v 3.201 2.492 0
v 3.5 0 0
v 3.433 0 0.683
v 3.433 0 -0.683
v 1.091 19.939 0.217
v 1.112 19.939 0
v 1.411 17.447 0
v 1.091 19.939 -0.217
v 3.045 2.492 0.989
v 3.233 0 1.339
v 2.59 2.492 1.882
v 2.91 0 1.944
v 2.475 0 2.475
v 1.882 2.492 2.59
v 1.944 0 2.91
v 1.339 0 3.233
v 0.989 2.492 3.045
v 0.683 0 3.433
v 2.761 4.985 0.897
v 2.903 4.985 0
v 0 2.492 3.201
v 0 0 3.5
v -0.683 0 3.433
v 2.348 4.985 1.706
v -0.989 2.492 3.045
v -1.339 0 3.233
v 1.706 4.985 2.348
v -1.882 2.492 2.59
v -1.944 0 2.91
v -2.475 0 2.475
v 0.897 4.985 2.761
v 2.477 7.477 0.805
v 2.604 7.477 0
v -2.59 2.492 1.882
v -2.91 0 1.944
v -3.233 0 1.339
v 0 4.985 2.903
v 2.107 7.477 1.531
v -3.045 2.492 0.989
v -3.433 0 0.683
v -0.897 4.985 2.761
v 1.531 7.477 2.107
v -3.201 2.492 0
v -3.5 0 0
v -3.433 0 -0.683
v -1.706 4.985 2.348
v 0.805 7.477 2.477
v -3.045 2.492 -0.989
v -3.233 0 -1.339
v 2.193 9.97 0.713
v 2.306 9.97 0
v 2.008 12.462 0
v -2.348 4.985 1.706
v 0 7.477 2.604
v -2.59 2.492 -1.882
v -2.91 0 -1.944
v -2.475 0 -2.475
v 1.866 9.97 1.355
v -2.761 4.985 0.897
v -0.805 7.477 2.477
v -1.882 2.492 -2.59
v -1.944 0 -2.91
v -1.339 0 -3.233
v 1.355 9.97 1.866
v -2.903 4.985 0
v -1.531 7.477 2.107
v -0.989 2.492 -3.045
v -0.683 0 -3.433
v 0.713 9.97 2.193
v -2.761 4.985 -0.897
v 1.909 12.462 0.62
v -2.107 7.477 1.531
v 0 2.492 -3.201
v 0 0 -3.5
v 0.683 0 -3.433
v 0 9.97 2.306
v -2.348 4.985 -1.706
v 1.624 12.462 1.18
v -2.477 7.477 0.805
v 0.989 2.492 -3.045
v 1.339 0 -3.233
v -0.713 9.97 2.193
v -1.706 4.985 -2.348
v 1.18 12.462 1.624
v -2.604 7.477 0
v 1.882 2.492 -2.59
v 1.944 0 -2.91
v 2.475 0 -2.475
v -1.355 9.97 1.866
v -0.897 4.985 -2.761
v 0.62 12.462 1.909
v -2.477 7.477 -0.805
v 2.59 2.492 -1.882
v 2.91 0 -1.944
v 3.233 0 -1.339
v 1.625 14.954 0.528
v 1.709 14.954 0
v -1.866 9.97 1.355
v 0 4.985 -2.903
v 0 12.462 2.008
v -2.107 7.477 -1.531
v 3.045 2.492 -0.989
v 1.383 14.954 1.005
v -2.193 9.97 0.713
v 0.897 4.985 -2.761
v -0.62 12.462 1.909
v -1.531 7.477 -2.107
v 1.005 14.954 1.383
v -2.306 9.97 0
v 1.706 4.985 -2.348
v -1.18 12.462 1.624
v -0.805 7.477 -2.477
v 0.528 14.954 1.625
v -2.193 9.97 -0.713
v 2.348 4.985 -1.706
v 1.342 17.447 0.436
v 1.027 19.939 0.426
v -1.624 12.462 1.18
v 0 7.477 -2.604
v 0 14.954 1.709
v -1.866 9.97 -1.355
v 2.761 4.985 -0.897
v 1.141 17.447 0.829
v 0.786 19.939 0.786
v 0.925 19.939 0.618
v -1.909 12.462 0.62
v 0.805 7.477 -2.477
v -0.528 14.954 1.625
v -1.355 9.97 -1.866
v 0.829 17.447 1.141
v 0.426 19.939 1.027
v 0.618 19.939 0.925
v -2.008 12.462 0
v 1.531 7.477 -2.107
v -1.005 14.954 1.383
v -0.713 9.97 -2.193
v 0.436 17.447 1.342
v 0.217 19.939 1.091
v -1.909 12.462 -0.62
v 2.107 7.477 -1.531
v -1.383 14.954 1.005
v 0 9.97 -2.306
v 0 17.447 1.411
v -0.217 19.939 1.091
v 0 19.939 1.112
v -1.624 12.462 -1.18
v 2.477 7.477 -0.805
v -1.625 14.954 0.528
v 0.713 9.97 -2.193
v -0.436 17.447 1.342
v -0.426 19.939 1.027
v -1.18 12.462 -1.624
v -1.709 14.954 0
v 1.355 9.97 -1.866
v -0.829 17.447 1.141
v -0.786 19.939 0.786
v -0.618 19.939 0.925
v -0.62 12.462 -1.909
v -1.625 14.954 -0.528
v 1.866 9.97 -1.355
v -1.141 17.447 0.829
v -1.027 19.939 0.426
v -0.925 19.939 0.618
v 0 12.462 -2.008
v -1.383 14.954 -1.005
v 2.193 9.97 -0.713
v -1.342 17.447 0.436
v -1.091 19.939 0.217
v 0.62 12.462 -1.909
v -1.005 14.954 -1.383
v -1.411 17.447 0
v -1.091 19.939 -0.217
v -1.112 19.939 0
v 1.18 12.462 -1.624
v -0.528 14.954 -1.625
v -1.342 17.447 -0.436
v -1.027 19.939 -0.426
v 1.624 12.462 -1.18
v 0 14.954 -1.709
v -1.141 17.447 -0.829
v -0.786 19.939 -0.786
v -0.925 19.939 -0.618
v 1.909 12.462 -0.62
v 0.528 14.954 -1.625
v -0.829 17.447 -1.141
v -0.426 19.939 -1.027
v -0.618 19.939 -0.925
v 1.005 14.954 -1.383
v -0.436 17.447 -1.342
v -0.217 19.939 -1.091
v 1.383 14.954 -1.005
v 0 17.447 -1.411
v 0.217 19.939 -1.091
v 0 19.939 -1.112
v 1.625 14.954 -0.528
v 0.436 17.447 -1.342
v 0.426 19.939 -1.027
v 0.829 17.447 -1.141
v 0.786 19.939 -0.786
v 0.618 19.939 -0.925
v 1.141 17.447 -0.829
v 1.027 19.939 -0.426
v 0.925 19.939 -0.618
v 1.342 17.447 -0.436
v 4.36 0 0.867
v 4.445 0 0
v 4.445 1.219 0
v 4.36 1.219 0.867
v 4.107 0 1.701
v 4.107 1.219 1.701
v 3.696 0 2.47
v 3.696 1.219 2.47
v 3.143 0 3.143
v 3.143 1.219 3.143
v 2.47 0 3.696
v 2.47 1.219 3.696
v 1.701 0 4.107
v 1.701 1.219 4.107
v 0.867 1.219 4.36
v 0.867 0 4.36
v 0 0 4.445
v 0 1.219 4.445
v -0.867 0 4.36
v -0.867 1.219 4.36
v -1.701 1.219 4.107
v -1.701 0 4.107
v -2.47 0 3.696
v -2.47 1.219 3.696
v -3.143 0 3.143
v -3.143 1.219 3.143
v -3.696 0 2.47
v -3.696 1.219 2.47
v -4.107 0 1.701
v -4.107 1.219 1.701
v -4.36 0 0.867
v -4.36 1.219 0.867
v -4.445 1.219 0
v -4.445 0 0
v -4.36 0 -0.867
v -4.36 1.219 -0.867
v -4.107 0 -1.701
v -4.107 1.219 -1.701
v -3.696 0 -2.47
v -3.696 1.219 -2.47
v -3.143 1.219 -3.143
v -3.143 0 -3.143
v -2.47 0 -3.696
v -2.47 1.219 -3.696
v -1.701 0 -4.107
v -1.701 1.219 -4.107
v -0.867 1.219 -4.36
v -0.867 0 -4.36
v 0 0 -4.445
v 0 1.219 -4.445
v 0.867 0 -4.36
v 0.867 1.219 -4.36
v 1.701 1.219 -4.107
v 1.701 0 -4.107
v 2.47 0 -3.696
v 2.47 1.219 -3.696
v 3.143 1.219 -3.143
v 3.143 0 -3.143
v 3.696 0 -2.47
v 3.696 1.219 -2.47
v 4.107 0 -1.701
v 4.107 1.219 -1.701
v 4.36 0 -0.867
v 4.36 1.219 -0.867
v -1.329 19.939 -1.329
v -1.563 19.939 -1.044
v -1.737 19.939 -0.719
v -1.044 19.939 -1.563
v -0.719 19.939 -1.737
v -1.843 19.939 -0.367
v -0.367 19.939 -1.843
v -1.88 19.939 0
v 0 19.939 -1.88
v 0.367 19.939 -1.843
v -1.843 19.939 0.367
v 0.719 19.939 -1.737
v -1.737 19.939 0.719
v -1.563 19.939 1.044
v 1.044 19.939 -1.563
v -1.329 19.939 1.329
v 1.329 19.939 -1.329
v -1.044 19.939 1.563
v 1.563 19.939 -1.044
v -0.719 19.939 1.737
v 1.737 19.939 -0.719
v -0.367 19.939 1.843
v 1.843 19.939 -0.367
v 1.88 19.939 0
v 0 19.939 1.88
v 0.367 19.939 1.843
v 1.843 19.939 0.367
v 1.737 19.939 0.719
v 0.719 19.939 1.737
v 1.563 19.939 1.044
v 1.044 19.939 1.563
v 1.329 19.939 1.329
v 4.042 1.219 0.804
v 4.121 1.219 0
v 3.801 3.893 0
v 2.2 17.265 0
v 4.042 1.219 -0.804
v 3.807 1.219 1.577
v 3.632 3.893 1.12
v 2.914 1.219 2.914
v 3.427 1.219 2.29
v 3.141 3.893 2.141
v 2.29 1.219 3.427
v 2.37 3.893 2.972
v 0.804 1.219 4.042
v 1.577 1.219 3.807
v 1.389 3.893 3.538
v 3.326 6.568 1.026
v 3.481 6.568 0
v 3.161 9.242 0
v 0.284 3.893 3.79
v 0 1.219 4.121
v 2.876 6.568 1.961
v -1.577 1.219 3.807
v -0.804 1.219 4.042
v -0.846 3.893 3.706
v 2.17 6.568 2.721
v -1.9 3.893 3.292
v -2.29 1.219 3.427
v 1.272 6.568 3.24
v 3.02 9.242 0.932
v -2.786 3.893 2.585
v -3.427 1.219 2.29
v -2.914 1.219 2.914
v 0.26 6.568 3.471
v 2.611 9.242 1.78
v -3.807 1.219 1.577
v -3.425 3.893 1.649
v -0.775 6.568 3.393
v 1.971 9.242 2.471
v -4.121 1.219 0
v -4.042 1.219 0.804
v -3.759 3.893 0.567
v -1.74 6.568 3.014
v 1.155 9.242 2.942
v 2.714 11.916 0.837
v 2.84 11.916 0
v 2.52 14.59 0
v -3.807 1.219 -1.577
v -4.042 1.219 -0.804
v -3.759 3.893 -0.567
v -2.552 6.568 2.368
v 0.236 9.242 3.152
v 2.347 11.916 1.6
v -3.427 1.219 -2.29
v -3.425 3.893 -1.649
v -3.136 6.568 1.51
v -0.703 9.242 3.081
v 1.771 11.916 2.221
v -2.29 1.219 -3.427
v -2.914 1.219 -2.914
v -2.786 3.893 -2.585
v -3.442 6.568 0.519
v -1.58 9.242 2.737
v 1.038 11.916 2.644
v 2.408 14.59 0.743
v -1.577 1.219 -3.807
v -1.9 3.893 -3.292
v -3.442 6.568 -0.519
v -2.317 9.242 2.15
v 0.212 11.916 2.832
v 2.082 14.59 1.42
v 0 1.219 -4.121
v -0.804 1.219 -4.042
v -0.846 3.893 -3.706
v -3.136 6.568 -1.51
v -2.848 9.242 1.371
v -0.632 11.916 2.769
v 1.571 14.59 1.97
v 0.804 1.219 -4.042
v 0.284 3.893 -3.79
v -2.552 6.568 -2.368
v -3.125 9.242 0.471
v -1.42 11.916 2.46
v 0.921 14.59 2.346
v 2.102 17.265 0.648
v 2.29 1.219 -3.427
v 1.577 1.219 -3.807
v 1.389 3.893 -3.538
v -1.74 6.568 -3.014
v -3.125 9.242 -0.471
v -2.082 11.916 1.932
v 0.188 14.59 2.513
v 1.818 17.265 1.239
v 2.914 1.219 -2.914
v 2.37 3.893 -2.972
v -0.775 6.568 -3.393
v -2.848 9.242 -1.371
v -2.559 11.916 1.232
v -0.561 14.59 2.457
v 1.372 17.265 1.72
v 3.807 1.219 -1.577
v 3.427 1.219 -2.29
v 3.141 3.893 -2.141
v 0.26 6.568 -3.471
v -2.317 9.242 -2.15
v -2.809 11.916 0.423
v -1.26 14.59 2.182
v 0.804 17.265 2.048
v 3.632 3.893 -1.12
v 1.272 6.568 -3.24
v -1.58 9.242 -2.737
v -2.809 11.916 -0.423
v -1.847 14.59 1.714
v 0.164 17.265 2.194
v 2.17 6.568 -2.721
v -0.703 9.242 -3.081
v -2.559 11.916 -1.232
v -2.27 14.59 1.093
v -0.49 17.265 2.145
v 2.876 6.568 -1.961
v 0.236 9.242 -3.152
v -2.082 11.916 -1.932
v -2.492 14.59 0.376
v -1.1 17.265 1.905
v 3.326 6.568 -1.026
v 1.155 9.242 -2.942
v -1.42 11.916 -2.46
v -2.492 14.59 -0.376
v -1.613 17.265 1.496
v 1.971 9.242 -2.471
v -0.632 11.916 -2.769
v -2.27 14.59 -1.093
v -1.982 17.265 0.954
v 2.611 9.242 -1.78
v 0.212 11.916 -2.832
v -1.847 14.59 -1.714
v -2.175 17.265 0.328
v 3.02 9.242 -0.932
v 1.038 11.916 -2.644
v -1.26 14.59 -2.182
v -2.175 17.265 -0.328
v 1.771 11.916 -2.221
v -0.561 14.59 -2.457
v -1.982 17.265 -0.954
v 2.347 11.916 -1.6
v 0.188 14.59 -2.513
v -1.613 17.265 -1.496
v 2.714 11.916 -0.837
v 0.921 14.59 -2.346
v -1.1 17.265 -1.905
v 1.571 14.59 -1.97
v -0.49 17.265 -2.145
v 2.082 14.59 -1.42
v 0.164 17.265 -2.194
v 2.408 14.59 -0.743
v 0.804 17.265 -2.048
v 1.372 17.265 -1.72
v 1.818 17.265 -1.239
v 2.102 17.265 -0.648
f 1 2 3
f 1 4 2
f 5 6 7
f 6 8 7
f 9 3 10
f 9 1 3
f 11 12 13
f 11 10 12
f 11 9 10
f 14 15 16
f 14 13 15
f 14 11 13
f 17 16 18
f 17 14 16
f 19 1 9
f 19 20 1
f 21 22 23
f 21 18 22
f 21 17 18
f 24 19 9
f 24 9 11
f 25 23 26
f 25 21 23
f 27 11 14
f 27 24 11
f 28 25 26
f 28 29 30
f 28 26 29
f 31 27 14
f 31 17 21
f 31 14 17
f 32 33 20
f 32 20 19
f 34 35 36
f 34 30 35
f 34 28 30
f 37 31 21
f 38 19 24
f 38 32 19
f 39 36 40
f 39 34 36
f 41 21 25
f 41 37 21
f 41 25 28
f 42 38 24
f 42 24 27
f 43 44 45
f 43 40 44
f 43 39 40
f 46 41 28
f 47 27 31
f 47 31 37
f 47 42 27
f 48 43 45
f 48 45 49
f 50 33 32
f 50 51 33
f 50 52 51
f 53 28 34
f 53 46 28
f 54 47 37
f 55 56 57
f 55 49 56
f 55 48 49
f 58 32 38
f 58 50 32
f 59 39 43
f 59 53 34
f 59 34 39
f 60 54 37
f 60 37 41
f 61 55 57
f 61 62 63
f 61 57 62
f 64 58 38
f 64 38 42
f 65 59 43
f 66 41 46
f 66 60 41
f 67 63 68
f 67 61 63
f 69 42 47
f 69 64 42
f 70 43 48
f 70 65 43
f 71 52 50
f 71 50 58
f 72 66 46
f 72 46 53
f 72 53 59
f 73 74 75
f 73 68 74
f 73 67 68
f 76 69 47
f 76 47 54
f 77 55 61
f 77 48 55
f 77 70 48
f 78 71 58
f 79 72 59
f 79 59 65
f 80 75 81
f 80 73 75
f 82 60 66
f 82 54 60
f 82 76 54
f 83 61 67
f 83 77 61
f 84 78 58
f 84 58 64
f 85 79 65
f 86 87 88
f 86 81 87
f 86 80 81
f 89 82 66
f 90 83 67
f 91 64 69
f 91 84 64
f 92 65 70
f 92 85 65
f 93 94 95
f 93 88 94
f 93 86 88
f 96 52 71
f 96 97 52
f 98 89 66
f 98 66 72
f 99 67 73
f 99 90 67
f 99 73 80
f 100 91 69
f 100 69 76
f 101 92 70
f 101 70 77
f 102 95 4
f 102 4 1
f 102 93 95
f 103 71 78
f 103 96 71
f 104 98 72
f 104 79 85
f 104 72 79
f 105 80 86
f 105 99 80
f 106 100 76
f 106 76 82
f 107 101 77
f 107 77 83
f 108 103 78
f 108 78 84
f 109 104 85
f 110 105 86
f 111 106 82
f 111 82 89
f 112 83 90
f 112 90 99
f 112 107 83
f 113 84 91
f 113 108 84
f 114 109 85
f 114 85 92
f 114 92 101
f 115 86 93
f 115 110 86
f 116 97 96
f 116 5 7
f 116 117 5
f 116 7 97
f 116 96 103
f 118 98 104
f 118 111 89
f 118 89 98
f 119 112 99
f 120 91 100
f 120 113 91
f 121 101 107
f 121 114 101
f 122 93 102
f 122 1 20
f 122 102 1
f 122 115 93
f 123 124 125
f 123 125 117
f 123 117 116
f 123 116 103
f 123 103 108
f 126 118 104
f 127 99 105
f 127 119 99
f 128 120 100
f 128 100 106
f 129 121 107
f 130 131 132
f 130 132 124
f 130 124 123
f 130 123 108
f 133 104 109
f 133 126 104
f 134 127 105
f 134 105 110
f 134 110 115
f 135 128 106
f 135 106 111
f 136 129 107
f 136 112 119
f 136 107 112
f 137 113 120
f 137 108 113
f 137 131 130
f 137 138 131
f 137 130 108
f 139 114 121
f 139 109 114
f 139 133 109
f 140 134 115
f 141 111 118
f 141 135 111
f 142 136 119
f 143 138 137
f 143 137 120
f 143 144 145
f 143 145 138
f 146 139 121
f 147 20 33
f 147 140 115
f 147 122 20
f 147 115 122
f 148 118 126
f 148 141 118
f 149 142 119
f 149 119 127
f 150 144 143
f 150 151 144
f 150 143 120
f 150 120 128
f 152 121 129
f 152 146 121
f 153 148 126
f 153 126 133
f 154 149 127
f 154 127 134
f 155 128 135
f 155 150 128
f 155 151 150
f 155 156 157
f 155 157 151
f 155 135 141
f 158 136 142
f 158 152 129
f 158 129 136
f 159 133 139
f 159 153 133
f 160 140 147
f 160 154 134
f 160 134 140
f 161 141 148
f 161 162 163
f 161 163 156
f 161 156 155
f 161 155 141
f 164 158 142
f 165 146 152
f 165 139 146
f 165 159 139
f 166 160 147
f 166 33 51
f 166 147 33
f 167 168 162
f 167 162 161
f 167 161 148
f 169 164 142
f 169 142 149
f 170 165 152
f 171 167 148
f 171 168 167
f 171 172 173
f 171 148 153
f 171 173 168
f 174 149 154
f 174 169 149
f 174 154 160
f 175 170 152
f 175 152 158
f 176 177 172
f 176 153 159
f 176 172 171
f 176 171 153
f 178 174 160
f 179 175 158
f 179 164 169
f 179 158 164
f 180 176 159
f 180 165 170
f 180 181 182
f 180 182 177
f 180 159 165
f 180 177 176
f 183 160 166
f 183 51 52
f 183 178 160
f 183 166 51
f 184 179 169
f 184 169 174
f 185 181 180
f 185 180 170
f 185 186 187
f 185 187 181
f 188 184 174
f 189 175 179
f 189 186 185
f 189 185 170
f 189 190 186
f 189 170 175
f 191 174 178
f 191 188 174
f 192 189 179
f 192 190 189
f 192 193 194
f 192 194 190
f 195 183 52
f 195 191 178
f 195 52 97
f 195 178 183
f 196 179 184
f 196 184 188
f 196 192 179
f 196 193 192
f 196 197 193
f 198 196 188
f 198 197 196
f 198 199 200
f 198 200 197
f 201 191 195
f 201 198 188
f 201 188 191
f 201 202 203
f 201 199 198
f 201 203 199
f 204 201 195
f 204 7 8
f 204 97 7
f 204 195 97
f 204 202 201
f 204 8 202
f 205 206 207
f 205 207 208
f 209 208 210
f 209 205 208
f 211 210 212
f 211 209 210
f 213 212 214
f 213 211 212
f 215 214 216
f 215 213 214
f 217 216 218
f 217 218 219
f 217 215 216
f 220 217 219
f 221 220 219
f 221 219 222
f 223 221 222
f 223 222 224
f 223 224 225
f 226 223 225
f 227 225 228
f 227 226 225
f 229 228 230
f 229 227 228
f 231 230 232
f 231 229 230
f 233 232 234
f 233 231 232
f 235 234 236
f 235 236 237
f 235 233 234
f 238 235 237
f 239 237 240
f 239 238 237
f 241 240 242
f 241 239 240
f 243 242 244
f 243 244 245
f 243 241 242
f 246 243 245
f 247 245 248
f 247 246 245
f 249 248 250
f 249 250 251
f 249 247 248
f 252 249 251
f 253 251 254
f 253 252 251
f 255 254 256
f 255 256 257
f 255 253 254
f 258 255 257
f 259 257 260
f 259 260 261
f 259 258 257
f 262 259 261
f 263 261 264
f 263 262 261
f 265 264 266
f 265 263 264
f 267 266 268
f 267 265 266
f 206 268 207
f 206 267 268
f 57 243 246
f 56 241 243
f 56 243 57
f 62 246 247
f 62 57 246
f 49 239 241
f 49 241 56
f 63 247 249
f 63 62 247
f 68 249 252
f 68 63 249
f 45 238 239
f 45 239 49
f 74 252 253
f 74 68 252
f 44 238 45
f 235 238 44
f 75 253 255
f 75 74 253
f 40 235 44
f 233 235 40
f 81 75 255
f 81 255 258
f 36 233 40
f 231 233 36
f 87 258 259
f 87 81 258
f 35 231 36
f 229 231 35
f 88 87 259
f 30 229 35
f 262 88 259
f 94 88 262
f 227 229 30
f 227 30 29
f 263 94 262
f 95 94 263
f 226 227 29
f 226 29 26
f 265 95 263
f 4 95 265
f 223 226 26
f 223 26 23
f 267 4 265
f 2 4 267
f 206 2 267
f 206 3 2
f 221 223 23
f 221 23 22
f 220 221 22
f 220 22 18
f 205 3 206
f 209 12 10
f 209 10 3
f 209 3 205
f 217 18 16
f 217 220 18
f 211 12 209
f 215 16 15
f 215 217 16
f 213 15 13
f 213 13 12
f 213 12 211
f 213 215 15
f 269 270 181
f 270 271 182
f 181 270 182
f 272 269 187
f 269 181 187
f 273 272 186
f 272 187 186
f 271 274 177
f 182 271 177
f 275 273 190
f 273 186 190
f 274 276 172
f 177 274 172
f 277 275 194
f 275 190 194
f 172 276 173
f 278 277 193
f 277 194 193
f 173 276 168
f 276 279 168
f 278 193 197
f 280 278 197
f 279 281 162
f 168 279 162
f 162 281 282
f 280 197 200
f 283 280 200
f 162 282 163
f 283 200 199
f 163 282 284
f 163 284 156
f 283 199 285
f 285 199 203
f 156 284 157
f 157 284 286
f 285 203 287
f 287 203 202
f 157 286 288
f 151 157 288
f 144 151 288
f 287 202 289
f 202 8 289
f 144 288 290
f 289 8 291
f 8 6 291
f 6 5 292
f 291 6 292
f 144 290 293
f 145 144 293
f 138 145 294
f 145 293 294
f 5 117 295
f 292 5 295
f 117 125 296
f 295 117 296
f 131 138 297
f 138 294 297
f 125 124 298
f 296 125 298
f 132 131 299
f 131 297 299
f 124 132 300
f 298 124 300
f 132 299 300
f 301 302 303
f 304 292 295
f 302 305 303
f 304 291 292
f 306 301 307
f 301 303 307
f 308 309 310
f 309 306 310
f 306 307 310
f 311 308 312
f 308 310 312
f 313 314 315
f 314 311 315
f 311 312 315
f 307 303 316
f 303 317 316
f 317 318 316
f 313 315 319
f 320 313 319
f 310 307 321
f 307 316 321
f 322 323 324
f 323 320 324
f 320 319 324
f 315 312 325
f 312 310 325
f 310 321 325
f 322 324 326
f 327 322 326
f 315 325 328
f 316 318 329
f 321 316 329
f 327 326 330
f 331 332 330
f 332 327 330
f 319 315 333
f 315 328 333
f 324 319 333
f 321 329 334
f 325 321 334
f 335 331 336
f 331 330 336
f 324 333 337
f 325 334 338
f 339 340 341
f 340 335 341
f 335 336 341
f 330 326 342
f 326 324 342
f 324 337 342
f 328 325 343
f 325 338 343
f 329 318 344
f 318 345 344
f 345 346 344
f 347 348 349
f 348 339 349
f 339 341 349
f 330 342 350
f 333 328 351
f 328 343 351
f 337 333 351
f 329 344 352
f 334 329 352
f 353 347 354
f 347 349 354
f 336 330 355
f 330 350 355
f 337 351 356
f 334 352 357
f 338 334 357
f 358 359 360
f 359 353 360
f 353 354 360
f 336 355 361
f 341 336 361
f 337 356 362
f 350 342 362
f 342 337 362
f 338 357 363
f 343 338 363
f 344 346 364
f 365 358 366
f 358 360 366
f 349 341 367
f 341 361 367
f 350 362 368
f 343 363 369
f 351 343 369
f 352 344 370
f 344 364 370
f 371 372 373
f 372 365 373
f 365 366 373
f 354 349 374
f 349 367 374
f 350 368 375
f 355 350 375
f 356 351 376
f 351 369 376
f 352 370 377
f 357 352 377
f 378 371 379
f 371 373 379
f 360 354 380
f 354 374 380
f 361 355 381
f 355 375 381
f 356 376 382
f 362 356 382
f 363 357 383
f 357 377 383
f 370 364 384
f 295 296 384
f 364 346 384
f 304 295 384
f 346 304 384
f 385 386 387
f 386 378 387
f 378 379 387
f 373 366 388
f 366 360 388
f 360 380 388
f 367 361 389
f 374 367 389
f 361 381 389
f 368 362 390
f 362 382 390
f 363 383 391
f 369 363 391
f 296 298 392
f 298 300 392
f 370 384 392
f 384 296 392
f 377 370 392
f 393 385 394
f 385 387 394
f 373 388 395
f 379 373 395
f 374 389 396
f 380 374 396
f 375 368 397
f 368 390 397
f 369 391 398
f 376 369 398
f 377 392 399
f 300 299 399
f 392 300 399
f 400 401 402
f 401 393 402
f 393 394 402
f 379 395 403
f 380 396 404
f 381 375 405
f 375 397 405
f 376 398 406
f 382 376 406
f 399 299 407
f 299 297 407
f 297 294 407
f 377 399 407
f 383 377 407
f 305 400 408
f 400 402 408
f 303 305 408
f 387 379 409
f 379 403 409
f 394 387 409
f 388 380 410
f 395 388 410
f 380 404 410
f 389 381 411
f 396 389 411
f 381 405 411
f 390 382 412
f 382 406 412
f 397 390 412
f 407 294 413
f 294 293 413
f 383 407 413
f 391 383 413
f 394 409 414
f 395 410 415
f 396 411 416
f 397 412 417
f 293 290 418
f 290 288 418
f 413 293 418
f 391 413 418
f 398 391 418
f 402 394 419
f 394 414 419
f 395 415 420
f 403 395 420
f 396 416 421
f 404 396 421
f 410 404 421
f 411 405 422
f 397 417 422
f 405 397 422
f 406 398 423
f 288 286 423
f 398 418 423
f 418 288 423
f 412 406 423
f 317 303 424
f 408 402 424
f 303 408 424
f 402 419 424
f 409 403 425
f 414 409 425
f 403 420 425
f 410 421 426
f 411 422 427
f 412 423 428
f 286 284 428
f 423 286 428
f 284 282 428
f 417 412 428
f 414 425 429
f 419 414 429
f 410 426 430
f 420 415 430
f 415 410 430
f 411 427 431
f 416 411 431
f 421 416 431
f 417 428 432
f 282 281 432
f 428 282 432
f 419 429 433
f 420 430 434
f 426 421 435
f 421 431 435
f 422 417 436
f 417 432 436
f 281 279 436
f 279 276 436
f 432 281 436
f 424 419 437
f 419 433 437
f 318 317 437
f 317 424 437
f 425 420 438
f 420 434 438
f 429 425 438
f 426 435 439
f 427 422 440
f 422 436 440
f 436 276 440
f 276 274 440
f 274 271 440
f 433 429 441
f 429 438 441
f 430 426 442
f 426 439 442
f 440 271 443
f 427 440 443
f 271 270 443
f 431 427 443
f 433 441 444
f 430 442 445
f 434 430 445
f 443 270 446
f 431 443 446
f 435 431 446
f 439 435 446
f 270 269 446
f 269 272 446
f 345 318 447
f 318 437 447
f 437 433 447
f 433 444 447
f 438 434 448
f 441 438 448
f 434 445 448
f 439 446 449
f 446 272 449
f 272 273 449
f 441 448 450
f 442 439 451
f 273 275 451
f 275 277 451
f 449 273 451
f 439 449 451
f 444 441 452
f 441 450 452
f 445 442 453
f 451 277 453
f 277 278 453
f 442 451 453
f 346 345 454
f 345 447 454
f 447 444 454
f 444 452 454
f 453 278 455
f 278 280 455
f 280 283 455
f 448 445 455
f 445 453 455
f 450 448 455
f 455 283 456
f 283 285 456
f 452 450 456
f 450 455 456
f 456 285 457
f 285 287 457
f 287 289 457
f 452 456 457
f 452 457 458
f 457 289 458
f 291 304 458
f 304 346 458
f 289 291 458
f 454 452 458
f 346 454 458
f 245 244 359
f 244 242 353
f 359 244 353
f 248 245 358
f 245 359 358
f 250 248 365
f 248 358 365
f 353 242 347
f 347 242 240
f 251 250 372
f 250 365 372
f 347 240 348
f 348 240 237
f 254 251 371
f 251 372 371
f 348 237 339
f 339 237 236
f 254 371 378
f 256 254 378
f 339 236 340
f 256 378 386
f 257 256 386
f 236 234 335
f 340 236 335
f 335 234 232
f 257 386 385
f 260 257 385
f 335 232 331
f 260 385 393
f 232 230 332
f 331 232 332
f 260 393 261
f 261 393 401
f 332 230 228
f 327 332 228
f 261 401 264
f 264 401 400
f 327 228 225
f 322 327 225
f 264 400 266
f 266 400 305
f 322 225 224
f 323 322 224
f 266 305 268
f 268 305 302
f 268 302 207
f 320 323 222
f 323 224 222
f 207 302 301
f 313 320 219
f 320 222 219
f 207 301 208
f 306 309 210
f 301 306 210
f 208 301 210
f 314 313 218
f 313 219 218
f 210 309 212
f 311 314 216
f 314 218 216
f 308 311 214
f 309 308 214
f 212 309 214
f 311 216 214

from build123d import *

# Parameters (mm, degrees)
F0_R     = 4.2672
F2_R     = 1.8796
F4_T     = -0.762
F5_R     = 4.445
F5_R_2   = 3.4997563168
F6_DEPTH = 1.2192


with BuildPart() as f3:
    # F0 (on Front) → F3 section 0
    with BuildSketch(Plane.XZ):
        Circle(F0_R)
    # F2 (on offset) → F3 section 1
    with BuildSketch(Plane.XZ.offset(-19.939)):
        Circle(F2_R)
    loft()

    # F4
    f4_openings = [f3.faces().sort_by_distance(p)[0] for p in [
        (0, 0, 0),
        (0, 19.939, 0),
    ]]
    offset(amount=F4_T, openings=f4_openings, kind=Kind.INTERSECTION)

    # F5 (on Front) → F6 (join)
    with BuildSketch(Plane.XZ):
        Circle(F5_R)
        Circle(F5_R_2, mode=Mode.SUBTRACT)
    extrude(amount=-F6_DEPTH)


solid = f3.part
